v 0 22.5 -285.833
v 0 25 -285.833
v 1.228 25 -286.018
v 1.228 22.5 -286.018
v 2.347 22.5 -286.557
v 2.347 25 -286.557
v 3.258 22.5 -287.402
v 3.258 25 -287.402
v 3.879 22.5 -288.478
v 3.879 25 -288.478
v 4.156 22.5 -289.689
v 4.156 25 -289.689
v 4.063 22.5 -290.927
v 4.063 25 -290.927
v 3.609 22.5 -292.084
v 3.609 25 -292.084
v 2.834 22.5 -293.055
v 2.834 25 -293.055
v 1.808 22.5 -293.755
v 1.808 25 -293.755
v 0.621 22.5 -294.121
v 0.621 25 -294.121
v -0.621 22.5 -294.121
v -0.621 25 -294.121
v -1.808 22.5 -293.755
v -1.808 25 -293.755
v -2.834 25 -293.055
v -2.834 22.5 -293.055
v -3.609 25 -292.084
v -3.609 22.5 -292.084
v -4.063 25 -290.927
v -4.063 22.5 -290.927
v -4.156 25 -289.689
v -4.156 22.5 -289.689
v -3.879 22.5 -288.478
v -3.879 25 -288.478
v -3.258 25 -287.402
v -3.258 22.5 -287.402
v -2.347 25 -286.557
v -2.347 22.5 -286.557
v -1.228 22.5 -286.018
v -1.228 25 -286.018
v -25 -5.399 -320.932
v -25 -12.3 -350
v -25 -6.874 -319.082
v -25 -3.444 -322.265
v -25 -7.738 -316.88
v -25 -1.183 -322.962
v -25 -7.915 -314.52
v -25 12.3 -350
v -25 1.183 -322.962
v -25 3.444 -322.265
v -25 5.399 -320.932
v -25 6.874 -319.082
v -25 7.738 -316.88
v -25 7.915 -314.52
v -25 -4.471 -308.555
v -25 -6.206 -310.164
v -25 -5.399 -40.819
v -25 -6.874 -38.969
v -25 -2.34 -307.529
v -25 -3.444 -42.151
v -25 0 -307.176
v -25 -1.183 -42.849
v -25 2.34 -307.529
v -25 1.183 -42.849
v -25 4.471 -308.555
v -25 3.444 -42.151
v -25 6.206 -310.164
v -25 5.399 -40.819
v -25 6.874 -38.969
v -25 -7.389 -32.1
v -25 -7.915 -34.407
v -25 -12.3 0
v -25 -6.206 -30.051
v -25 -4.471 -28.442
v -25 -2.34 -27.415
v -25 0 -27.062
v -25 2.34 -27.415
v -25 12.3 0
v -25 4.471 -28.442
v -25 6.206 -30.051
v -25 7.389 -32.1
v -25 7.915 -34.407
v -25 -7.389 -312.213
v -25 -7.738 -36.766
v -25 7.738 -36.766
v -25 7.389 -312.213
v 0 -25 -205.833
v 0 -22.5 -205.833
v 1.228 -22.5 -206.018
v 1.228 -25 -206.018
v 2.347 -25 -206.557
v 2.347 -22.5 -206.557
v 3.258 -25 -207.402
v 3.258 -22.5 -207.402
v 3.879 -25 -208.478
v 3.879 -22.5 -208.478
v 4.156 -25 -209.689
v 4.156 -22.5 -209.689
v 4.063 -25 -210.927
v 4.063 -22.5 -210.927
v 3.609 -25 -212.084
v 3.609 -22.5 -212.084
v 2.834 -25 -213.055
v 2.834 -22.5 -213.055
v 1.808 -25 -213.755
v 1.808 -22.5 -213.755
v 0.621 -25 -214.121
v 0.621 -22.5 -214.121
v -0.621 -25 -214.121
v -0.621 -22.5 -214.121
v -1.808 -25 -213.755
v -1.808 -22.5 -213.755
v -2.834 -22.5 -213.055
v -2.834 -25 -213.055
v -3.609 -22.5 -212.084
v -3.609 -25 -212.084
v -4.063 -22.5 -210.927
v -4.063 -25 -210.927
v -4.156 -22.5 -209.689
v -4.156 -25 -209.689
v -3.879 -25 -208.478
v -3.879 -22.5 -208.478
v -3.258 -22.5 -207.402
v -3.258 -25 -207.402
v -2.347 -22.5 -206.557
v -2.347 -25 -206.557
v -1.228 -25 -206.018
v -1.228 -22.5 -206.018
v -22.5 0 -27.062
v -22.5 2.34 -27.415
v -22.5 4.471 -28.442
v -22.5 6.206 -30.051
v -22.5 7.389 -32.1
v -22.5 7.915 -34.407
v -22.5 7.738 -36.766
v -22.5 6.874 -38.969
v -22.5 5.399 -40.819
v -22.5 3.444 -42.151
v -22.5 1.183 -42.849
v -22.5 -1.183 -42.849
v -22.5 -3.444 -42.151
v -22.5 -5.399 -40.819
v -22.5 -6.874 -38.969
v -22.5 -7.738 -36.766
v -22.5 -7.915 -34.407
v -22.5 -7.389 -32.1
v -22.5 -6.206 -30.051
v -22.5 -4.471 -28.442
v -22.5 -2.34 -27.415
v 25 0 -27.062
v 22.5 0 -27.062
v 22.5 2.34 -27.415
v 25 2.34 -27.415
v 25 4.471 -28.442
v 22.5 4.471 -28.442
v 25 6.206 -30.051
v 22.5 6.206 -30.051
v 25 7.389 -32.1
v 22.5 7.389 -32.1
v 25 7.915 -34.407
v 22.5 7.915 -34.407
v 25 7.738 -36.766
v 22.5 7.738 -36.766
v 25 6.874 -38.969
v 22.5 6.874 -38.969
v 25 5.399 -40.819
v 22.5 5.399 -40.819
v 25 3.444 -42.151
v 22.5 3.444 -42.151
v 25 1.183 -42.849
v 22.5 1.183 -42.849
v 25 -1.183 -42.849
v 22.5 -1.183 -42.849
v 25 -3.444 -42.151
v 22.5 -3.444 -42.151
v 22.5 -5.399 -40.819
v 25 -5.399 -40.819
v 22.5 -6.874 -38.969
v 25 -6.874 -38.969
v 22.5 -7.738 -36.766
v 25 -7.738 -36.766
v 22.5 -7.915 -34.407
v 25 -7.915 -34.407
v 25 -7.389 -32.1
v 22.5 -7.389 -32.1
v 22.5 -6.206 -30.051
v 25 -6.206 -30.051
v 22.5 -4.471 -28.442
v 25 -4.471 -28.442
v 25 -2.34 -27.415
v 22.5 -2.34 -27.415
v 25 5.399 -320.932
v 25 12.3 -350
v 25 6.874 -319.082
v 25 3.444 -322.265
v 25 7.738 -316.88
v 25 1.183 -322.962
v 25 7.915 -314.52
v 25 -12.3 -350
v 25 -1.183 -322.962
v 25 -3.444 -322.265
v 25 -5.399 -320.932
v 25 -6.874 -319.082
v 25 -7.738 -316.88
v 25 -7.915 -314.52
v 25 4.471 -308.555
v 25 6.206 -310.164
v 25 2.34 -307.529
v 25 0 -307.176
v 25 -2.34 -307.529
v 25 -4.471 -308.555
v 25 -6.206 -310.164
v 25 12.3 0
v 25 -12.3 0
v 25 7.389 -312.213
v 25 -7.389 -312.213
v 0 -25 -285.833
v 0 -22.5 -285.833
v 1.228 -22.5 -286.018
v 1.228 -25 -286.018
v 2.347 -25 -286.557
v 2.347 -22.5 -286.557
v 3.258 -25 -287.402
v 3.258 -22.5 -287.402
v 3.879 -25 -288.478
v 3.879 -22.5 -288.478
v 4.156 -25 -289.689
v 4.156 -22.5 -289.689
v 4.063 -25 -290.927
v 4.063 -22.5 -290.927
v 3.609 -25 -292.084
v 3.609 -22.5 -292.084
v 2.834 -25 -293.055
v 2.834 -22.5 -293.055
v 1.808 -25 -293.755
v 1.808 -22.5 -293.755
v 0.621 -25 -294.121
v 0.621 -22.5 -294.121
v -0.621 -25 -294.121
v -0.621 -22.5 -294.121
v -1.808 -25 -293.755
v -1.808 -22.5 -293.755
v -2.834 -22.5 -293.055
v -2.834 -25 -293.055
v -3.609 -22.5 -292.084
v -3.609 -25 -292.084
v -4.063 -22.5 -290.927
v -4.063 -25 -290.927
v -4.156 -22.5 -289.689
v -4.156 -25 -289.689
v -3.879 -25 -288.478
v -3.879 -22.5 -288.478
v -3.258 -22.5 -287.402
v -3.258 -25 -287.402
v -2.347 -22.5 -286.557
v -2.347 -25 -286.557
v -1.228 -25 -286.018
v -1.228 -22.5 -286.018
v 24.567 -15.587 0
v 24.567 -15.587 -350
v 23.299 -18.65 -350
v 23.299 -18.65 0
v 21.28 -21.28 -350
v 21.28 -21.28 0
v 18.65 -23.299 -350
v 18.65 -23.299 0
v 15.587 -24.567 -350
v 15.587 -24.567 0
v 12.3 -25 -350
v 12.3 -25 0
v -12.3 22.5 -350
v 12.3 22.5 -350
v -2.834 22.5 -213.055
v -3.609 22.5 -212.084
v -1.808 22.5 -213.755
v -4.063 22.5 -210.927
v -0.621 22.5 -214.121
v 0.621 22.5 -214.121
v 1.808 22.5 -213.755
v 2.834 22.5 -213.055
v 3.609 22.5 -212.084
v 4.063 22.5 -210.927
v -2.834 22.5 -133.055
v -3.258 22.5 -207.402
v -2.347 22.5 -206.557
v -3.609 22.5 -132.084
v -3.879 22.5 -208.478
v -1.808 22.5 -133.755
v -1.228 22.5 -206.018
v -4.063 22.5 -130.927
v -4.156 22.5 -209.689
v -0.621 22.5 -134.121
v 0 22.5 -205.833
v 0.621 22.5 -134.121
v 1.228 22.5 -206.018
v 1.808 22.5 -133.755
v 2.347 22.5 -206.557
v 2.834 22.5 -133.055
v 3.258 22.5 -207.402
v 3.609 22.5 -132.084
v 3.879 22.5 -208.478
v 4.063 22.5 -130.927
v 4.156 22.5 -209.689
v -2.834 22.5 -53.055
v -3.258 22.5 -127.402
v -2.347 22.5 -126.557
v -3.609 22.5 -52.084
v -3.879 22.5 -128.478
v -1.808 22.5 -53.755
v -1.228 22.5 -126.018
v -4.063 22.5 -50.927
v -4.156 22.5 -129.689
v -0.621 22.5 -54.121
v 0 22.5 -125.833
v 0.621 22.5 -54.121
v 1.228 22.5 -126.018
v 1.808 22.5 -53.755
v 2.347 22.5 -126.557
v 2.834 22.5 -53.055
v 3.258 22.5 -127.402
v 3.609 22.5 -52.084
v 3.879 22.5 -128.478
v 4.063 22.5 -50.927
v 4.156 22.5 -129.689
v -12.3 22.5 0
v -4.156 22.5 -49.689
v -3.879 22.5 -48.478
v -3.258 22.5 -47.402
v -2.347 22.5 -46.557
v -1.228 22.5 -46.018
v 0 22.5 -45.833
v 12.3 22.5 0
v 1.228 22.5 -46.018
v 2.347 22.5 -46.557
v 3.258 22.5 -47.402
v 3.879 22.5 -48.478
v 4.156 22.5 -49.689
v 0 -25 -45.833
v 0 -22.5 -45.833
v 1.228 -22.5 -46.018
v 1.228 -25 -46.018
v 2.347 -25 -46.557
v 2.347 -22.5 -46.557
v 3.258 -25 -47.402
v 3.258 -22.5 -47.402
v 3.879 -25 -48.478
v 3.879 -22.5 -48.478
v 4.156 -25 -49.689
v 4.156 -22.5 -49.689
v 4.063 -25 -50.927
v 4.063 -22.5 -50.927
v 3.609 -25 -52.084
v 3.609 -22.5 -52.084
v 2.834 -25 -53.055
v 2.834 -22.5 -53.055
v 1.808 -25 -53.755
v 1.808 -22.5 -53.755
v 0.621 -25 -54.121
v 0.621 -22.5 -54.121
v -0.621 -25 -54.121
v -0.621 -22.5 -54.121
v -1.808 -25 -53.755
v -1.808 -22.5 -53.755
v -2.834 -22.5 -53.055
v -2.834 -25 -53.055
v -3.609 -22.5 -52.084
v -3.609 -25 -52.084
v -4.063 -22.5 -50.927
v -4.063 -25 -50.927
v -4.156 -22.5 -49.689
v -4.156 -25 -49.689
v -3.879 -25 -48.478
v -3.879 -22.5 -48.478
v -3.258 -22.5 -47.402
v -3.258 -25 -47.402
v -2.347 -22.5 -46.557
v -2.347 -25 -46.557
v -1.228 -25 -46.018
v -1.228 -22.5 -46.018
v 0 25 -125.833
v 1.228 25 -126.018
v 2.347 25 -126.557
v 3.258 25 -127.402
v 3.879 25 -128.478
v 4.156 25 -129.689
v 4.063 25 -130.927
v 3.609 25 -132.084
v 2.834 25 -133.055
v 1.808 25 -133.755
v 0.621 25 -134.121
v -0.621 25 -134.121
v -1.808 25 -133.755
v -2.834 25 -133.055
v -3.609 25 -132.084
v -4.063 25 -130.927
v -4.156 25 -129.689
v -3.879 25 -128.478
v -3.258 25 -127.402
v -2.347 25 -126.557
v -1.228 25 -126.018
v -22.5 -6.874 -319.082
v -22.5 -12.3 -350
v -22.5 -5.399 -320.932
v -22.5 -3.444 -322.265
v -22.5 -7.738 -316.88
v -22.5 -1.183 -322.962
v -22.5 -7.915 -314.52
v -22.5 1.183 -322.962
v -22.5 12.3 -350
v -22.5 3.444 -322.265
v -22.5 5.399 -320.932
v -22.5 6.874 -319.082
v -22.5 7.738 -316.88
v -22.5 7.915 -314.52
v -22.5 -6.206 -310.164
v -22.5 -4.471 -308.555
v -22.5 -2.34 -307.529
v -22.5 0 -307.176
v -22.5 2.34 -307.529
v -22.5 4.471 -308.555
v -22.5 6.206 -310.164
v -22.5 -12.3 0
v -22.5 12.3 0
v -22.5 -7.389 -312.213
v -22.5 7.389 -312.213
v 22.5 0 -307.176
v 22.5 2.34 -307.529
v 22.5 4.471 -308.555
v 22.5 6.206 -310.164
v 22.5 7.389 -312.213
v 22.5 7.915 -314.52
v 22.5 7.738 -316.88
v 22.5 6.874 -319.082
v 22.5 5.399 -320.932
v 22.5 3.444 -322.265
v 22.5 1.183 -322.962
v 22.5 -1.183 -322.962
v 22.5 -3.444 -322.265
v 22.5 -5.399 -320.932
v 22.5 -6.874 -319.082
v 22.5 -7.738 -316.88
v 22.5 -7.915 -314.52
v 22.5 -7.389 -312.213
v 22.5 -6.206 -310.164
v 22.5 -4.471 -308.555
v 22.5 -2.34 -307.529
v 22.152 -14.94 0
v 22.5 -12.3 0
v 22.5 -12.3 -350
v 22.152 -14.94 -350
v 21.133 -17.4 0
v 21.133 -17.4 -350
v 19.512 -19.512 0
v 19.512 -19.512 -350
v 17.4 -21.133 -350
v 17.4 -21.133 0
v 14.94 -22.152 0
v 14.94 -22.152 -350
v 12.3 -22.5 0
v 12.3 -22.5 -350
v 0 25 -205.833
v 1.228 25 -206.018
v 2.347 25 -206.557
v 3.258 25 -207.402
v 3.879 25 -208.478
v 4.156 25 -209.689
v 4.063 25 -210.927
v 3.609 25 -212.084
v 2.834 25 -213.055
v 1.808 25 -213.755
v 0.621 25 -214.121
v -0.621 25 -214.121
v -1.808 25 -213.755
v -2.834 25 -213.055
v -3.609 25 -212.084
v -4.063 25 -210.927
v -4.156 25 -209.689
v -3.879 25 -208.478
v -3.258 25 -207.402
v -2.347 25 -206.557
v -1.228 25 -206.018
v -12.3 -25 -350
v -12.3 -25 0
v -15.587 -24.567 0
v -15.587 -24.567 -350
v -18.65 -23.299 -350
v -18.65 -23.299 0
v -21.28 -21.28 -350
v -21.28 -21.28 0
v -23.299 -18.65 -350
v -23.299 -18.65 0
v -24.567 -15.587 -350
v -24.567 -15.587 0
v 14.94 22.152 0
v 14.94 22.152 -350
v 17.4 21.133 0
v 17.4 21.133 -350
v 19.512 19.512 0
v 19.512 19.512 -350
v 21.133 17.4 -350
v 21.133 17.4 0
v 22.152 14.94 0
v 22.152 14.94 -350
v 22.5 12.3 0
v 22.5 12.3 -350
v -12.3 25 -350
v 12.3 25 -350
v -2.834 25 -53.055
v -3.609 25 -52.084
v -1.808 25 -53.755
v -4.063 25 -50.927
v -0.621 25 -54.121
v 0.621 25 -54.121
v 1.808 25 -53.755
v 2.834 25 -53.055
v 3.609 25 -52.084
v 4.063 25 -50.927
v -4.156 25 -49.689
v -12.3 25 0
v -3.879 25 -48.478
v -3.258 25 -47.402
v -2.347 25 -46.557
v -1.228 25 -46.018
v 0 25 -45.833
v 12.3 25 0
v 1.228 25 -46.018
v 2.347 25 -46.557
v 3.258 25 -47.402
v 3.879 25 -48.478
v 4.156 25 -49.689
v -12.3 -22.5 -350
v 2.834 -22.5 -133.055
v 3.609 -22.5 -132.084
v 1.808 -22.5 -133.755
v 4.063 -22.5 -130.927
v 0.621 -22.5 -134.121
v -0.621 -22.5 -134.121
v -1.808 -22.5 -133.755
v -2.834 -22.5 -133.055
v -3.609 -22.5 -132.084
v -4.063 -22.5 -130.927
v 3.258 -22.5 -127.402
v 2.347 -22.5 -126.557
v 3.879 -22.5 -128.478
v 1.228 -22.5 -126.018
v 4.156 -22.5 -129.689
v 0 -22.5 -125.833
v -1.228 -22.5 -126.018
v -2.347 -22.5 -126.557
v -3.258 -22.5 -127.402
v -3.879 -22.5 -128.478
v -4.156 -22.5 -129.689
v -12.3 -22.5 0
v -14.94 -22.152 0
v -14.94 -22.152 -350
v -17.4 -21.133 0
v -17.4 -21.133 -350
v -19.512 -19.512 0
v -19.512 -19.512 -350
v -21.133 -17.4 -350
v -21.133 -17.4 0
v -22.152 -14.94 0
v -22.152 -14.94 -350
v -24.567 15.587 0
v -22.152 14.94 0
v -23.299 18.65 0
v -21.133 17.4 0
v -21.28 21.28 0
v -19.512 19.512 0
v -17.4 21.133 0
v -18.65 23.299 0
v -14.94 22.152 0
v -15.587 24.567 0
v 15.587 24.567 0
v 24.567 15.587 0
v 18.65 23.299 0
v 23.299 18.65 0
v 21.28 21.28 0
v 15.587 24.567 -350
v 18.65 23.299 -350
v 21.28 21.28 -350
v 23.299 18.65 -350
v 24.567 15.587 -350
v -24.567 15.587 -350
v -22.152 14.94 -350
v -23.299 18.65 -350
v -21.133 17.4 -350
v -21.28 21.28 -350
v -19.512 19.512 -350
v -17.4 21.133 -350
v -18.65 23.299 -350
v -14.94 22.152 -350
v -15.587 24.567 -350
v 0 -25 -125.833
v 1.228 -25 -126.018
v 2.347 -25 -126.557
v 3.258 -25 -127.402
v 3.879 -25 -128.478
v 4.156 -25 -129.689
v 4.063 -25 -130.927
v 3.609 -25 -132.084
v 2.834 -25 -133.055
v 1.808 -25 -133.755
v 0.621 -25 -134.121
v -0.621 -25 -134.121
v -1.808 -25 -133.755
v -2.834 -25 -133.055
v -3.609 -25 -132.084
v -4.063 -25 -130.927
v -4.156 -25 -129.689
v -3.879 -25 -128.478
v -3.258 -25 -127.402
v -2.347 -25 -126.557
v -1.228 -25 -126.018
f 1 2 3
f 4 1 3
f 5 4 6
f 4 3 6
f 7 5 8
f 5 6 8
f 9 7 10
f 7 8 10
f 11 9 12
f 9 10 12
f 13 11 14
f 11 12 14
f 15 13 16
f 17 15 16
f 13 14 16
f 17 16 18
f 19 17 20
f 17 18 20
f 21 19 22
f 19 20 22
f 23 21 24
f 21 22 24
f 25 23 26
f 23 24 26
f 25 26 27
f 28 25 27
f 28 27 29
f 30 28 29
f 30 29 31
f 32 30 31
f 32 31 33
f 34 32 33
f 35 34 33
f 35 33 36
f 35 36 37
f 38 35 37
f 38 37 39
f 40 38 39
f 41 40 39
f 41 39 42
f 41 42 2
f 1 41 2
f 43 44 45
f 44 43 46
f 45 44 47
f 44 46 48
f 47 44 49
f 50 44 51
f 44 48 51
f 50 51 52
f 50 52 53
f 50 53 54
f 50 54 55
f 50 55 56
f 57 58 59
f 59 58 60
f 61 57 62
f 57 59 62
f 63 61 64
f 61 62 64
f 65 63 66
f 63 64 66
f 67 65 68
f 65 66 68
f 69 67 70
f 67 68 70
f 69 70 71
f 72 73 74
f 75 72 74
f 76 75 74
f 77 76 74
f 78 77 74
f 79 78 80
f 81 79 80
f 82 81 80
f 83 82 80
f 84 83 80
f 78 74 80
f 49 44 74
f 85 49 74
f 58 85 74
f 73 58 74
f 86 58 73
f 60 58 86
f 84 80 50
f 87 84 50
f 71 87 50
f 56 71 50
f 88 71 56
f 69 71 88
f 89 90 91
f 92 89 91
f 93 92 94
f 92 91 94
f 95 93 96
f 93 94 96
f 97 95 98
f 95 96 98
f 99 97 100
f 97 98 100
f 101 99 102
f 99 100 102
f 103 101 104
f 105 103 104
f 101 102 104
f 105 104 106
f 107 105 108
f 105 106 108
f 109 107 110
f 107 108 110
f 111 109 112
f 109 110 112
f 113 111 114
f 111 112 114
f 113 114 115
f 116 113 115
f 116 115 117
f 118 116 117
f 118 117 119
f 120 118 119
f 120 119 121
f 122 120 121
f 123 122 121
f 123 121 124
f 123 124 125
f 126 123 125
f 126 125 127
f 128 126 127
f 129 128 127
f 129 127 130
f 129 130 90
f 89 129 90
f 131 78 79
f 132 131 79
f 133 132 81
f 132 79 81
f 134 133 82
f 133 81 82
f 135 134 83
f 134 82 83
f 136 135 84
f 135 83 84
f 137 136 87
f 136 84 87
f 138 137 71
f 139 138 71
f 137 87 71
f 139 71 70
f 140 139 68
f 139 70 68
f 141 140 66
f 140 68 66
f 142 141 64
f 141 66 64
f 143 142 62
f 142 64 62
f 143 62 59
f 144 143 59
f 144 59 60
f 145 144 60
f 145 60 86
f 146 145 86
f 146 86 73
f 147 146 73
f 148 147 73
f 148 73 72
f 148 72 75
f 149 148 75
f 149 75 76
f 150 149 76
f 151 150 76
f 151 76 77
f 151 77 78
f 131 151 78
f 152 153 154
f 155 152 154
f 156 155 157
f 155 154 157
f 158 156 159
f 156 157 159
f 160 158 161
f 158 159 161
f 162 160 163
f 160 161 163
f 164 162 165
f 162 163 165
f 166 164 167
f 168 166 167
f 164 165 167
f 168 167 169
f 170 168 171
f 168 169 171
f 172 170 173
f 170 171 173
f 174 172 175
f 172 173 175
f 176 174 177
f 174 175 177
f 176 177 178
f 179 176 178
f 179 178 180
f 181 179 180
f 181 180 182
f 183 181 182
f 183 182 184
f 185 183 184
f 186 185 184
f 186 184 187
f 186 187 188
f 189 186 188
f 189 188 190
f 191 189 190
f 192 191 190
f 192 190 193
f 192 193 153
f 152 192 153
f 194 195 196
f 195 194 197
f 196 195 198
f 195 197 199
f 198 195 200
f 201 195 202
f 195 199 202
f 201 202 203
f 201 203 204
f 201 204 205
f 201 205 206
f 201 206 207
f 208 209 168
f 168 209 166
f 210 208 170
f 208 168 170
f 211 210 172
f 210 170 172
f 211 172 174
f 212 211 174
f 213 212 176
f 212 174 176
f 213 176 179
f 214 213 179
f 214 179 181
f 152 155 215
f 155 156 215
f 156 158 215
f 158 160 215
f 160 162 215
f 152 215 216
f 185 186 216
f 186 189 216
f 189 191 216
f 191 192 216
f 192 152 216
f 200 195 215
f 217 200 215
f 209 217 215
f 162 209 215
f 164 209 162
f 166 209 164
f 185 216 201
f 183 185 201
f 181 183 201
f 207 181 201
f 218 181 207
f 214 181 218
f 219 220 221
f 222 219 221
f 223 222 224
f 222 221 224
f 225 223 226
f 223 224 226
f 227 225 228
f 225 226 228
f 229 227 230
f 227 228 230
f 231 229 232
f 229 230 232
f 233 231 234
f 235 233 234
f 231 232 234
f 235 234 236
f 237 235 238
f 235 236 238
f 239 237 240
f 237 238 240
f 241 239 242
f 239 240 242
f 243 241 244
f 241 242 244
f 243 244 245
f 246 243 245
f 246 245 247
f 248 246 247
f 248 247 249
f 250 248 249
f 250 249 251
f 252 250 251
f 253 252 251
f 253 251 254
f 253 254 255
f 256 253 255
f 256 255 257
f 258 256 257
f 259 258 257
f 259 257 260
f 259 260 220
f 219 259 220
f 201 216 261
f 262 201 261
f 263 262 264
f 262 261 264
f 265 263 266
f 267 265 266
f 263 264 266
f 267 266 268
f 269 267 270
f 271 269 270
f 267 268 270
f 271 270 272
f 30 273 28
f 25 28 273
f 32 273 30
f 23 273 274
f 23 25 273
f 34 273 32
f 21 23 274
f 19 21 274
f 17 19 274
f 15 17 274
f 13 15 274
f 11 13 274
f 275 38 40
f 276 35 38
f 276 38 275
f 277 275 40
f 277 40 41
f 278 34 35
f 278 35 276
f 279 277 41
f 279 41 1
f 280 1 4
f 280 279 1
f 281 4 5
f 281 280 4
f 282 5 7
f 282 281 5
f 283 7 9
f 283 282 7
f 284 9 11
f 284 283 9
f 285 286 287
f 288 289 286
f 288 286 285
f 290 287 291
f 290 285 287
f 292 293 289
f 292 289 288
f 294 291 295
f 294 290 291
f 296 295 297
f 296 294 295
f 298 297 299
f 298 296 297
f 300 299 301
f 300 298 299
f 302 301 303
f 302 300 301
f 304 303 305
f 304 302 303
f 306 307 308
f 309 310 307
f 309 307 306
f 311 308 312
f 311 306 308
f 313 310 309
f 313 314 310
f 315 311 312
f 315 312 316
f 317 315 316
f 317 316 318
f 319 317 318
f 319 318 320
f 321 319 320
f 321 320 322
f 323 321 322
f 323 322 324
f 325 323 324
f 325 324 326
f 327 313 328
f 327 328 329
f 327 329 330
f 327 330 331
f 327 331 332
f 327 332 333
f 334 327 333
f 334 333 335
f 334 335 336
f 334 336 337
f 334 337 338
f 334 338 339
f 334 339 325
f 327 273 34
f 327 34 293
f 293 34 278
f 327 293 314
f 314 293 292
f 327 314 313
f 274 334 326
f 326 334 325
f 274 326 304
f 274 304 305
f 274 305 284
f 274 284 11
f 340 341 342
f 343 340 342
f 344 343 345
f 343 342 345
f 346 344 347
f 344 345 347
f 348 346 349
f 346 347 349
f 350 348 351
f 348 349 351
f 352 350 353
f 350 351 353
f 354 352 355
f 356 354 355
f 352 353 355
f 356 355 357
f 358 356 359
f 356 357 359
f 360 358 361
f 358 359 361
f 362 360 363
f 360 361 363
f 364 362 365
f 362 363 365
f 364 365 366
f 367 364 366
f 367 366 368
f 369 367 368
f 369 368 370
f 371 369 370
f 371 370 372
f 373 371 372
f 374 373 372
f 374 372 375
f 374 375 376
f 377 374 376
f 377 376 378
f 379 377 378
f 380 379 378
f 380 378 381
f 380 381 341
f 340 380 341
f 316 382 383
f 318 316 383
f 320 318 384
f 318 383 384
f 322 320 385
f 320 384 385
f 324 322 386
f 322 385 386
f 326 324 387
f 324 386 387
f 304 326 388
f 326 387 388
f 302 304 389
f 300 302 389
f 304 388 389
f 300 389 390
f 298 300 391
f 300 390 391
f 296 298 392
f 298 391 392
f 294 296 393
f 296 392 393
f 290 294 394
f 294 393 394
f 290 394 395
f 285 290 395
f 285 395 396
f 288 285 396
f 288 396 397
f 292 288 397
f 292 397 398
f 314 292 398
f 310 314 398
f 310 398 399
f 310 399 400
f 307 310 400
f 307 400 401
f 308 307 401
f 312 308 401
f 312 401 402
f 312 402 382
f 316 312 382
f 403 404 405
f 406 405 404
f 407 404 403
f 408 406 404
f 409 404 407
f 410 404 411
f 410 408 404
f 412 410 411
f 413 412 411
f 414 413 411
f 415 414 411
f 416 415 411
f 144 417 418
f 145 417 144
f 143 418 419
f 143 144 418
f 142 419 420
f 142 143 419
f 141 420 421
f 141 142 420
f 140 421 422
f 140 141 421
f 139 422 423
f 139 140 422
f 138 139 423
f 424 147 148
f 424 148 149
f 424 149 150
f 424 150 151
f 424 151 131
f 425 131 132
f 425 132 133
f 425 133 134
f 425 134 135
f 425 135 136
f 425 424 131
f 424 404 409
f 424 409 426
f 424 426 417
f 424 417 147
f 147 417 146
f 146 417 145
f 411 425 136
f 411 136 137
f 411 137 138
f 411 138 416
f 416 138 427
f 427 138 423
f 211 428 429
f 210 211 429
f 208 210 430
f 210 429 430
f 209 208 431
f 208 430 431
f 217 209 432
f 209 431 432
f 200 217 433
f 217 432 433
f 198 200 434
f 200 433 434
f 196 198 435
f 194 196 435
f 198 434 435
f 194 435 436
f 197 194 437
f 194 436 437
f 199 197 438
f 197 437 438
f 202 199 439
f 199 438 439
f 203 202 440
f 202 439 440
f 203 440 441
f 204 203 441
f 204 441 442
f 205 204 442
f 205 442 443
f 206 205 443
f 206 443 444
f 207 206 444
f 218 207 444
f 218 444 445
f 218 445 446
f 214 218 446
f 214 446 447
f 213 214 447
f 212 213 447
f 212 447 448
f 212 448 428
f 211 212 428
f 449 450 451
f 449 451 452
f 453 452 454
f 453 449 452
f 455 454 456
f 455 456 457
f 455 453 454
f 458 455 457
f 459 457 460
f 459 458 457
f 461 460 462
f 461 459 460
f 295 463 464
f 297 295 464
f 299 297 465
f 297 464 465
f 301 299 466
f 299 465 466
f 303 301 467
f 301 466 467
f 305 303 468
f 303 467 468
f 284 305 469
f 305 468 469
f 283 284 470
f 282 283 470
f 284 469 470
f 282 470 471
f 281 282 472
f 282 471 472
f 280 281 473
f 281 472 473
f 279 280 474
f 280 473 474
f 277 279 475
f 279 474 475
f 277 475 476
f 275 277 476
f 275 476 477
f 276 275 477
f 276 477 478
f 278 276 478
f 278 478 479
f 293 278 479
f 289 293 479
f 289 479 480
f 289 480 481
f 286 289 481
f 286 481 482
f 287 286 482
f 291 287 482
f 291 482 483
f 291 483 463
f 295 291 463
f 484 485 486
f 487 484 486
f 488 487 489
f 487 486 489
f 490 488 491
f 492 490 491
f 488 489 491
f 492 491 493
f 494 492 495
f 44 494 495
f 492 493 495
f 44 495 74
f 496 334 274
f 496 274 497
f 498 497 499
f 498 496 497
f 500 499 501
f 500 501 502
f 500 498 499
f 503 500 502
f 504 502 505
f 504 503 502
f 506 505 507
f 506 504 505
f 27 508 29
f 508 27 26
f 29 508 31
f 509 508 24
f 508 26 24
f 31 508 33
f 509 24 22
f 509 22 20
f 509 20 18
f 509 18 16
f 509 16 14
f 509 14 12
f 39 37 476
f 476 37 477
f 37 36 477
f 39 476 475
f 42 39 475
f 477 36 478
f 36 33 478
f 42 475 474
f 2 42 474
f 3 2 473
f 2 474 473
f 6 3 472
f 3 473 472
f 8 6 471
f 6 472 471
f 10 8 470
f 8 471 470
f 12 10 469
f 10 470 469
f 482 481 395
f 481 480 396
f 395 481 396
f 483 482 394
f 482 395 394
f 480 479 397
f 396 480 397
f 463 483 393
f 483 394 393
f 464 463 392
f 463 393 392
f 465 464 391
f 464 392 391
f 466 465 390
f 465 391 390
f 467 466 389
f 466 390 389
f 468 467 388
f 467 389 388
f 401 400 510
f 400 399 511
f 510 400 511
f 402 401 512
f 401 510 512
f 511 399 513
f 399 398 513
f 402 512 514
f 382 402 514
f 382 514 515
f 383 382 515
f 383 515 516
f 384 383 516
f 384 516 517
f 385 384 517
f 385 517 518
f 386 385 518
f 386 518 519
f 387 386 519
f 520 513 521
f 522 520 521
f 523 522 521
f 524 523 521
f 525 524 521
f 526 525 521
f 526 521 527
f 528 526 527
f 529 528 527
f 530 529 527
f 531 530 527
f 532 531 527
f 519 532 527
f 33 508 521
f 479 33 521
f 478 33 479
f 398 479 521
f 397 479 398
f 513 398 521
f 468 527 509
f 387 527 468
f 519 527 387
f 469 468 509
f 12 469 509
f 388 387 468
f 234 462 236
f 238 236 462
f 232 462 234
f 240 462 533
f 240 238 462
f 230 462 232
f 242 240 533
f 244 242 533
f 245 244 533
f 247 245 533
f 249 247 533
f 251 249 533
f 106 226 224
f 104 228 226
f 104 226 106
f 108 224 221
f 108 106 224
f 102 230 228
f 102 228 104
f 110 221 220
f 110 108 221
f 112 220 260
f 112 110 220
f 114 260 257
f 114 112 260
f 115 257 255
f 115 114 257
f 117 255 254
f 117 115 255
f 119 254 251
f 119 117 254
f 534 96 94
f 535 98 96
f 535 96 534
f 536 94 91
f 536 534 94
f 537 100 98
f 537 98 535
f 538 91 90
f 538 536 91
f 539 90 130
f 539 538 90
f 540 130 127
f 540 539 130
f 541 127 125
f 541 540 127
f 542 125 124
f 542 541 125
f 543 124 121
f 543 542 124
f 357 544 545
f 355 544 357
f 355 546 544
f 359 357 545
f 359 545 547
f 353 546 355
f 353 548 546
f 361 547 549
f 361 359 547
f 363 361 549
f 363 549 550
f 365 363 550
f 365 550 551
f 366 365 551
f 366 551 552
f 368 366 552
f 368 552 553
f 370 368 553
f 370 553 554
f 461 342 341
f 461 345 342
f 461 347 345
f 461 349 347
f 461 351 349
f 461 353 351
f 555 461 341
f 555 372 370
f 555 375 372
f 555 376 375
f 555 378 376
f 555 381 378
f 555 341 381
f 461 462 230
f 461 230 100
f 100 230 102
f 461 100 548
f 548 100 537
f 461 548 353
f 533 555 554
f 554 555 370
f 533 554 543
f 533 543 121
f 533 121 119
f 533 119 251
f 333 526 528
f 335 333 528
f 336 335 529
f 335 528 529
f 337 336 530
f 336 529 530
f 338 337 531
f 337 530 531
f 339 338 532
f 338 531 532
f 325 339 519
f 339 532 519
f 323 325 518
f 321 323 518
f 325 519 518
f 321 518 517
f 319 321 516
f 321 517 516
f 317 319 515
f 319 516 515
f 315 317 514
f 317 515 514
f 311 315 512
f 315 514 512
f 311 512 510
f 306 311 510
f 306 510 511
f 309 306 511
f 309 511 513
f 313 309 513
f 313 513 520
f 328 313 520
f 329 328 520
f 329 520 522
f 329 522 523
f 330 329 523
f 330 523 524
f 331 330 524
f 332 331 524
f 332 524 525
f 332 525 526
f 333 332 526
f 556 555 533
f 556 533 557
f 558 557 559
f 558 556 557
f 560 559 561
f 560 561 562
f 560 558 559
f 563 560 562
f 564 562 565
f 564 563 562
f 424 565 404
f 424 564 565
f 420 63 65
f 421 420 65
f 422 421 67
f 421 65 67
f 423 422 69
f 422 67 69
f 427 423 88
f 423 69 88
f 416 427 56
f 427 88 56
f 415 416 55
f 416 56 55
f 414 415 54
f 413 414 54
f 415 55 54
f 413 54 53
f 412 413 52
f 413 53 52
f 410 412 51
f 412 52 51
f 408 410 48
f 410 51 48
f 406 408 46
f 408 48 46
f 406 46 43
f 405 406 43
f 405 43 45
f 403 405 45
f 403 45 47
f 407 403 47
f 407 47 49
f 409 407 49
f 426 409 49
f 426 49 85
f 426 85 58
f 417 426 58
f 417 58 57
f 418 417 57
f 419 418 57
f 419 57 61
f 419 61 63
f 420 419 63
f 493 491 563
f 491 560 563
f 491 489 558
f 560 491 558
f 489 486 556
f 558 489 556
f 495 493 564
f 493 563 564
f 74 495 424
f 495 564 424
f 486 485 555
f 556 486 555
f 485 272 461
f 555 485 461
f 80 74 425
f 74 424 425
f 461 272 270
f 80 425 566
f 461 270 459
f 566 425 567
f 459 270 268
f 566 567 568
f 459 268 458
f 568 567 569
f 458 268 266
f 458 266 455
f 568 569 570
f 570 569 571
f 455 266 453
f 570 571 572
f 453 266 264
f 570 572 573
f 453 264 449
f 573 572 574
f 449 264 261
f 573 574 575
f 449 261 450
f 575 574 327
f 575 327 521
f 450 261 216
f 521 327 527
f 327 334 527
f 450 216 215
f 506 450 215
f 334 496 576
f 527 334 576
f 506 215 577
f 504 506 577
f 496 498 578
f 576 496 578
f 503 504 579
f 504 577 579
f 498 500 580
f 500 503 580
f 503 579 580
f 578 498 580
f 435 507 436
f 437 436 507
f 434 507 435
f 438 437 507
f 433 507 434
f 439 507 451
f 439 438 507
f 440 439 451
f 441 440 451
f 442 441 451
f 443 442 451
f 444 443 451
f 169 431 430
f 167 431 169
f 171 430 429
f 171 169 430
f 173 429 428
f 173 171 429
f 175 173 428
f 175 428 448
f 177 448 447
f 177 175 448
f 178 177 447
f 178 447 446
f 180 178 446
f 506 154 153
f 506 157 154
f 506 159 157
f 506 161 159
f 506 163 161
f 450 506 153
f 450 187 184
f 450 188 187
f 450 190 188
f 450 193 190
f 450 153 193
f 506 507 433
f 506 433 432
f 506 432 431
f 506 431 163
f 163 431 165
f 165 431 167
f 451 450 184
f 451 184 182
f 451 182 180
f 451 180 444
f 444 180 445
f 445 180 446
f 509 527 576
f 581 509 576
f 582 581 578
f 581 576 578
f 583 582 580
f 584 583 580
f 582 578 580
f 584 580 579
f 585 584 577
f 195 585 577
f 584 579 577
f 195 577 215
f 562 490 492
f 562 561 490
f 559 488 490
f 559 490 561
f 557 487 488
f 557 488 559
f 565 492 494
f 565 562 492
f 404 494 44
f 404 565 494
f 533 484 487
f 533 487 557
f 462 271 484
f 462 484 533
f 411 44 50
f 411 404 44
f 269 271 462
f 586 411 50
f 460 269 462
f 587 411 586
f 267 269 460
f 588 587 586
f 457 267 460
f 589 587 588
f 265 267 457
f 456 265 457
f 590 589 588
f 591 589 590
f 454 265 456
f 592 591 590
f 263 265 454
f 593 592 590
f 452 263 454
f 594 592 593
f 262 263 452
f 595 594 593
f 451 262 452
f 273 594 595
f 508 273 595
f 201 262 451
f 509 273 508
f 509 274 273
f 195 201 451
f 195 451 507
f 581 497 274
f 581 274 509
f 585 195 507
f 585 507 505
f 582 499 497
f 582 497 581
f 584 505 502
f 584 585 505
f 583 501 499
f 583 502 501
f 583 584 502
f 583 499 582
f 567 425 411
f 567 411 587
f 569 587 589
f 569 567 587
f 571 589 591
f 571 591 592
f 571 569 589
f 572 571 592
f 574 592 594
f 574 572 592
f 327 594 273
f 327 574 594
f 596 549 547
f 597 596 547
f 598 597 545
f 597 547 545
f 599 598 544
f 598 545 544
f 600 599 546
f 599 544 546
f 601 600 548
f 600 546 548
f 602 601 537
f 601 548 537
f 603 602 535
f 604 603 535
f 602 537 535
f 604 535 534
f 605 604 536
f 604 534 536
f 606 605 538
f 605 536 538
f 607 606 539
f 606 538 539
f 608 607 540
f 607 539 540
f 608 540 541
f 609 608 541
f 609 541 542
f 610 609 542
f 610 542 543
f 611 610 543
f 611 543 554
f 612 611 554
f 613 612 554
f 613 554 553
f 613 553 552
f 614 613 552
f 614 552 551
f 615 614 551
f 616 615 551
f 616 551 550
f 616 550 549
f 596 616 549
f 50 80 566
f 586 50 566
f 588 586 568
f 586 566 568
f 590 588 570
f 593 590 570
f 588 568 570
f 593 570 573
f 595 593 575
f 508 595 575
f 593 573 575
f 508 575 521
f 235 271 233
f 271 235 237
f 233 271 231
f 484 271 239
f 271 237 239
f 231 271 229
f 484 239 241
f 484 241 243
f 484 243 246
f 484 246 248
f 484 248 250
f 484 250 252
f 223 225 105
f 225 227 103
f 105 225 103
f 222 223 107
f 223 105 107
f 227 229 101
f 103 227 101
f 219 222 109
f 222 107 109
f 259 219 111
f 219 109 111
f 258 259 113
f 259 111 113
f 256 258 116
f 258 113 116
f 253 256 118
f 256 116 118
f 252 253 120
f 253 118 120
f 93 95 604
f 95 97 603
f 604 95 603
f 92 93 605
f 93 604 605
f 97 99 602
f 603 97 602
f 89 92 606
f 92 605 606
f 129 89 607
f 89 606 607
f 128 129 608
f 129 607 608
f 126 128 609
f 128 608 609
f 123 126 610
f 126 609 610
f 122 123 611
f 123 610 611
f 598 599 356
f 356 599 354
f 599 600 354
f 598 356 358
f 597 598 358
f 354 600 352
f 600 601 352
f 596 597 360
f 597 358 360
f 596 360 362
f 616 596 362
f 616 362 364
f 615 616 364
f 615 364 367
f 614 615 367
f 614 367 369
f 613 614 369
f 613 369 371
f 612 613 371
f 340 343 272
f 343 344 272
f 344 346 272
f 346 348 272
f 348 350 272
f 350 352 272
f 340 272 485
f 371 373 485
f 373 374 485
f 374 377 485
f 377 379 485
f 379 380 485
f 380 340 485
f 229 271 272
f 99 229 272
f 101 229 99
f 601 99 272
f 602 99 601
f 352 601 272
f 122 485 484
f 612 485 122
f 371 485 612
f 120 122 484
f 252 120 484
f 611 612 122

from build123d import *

# Parameters (mm, degrees)
SQUARE_TUBE_2_X_2_X_0_25_1_DEPTH = 350
CUT_EXTRUDE1_REACH               = 356.436
SKETCH16_R                       = 7.9375
CUT_EXTRUDE2_REACH               = 356.436
SKETCH18_R                       = 7.9375
CUT_EXTRUDE3_REACH               = 356.436
SKETCH19_R                       = 4.1671875


with BuildPart() as part:
    # Sketch15 → Square tube 2 X 2 X 0.25(1) (new body)
    with BuildSketch(Plane.YX):
        with BuildLine():
            Line((-12.3, -25), (12.3, -25))
            ThreePointArc((12.3, -25), (21.280256121, -21.280256121), (25, -12.3))
            Line((25, -12.3), (25, 12.3))
            ThreePointArc((25, 12.3), (21.280256121, 21.280256121), (12.3, 25))
            Line((12.3, 25), (-12.3, 25))
            ThreePointArc((-12.3, 25), (-21.280256121, 21.280256121), (-25, 12.3))
            Line((-25, 12.3), (-25, -12.3))
            ThreePointArc((-25, -12.3), (-21.280256121, -21.280256121), (-12.3, -25))
        make_face()
        with BuildLine():
            Line((-12.3, -22.5), (12.3, -22.5))
            ThreePointArc((12.3, -22.5), (19.512489168, -19.512489168), (22.5, -12.3))
            Line((22.5, -12.3), (22.5, 12.3))
            ThreePointArc((22.5, 12.3), (19.512489168, 19.512489168), (12.3, 22.5))
            Line((12.3, 22.5), (-12.3, 22.5))
            ThreePointArc((-12.3, 22.5), (-19.512489168, 19.512489168), (-22.5, 12.3))
            Line((-22.5, 12.3), (-22.5, -12.3))
            ThreePointArc((-22.5, -12.3), (-19.512489168, -19.512489168), (-12.3, -22.5))
        make_face(mode=Mode.SUBTRACT)
    extrude(amount=SQUARE_TUBE_2_X_2_X_0_25_1_DEPTH)

    # Cut-Extrude1: up to this face of the body (flat: up to its plane)
    cut_extrude1_end = Plane(part.part.faces().sort_by_distance((25, 0, -175))[0])
    # Sketch16 → Cut-Extrude1 (cut, up to the picked face)
    with BuildSketch(Plane.ZY.offset(25), mode=Mode.PRIVATE) as cut_extrude1_sk1:
        with Locations((-35, 0)):
            Circle(SKETCH16_R)
    cut_extrude1_tool1 = split(extrude(cut_extrude1_sk1.sketch, amount=-CUT_EXTRUDE1_REACH, mode=Mode.PRIVATE), bisect_by=cut_extrude1_end, keep=Keep.BOTH, mode=Mode.PRIVATE)
    add(cut_extrude1_tool1.solids().sort_by(Axis((-25, 0, -35), (1, 0, 0)))[0], mode=Mode.SUBTRACT)

    # Cut-Extrude2: up to this face of the body (flat: up to its plane)
    cut_extrude2_end = Plane(part.part.faces().sort_by_distance((25, 0, -178.294144468))[0])
    # Sketch18 → Cut-Extrude2 (cut, up to the picked face)
    with BuildSketch(Plane.ZY.offset(25), mode=Mode.PRIVATE) as cut_extrude2_sk1:
        with Locations((-315.113369307, 0)):
            Circle(SKETCH18_R)
    cut_extrude2_tool1 = split(extrude(cut_extrude2_sk1.sketch, amount=-CUT_EXTRUDE2_REACH, mode=Mode.PRIVATE), bisect_by=cut_extrude2_end, keep=Keep.BOTH, mode=Mode.PRIVATE)
    add(cut_extrude2_tool1.solids().sort_by(Axis((-25, 0, -315.113369), (1, 0, 0)))[0], mode=Mode.SUBTRACT)

    # Cut-Extrude3: up to this face of the body (flat: up to its plane)
    cut_extrude3_end = Plane(part.part.faces().sort_by_distance((0, -25, -175))[0])
    # Sketch19 → Cut-Extrude3 (cut, up to the picked face)
    with BuildSketch(Plane(origin=(0, 25, 0), x_dir=(-1, 0, 0), z_dir=(0, 1, 0)), mode=Mode.PRIVATE) as cut_extrude3_sk1:
        with Locations(Location((0, -290, 0), (0, 0, 90))):
            Circle(SKETCH19_R)
    cut_extrude3_tool1 = split(extrude(cut_extrude3_sk1.sketch, amount=-CUT_EXTRUDE3_REACH, mode=Mode.PRIVATE), bisect_by=cut_extrude3_end, keep=Keep.BOTH, mode=Mode.PRIVATE)
    # Sketch19 → Cut-Extrude3 (cut, up to the picked face)
    with BuildSketch(Plane(origin=(0, 25, 0), x_dir=(-1, 0, 0), z_dir=(0, 1, 0)), mode=Mode.PRIVATE) as cut_extrude3_sk2:
        with Locations(Location((0, -210, 0), (0, 0, 90))):
            Circle(SKETCH19_R)
    cut_extrude3_tool2 = split(extrude(cut_extrude3_sk2.sketch, amount=-CUT_EXTRUDE3_REACH, mode=Mode.PRIVATE), bisect_by=cut_extrude3_end, keep=Keep.BOTH, mode=Mode.PRIVATE)
    # Sketch19 → Cut-Extrude3 (cut, up to the picked face)
    with BuildSketch(Plane(origin=(0, 25, 0), x_dir=(-1, 0, 0), z_dir=(0, 1, 0)), mode=Mode.PRIVATE) as cut_extrude3_sk3:
        with Locations(Location((0, -130, 0), (0, 0, 90))):
            Circle(SKETCH19_R)
    cut_extrude3_tool3 = split(extrude(cut_extrude3_sk3.sketch, amount=-CUT_EXTRUDE3_REACH, mode=Mode.PRIVATE), bisect_by=cut_extrude3_end, keep=Keep.BOTH, mode=Mode.PRIVATE)
    # Sketch19 → Cut-Extrude3 (cut, up to the picked face)
    with BuildSketch(Plane(origin=(0, 25, 0), x_dir=(-1, 0, 0), z_dir=(0, 1, 0)), mode=Mode.PRIVATE) as cut_extrude3_sk4:
        with Locations(Location((0, -50, 0), (0, 0, 90))):
            Circle(SKETCH19_R)
    cut_extrude3_tool4 = split(extrude(cut_extrude3_sk4.sketch, amount=-CUT_EXTRUDE3_REACH, mode=Mode.PRIVATE), bisect_by=cut_extrude3_end, keep=Keep.BOTH, mode=Mode.PRIVATE)
    add(cut_extrude3_tool1.solids().sort_by(Axis((0, 25, -290), (0, -1, 0)))[0], mode=Mode.SUBTRACT)
    add(cut_extrude3_tool2.solids().sort_by(Axis((0, 25, -210), (0, -1, 0)))[0], mode=Mode.SUBTRACT)
    add(cut_extrude3_tool3.solids().sort_by(Axis((0, 25, -130), (0, -1, 0)))[0], mode=Mode.SUBTRACT)
    add(cut_extrude3_tool4.solids().sort_by(Axis((0, 25, -50), (0, -1, 0)))[0], mode=Mode.SUBTRACT)


solid = part.part
